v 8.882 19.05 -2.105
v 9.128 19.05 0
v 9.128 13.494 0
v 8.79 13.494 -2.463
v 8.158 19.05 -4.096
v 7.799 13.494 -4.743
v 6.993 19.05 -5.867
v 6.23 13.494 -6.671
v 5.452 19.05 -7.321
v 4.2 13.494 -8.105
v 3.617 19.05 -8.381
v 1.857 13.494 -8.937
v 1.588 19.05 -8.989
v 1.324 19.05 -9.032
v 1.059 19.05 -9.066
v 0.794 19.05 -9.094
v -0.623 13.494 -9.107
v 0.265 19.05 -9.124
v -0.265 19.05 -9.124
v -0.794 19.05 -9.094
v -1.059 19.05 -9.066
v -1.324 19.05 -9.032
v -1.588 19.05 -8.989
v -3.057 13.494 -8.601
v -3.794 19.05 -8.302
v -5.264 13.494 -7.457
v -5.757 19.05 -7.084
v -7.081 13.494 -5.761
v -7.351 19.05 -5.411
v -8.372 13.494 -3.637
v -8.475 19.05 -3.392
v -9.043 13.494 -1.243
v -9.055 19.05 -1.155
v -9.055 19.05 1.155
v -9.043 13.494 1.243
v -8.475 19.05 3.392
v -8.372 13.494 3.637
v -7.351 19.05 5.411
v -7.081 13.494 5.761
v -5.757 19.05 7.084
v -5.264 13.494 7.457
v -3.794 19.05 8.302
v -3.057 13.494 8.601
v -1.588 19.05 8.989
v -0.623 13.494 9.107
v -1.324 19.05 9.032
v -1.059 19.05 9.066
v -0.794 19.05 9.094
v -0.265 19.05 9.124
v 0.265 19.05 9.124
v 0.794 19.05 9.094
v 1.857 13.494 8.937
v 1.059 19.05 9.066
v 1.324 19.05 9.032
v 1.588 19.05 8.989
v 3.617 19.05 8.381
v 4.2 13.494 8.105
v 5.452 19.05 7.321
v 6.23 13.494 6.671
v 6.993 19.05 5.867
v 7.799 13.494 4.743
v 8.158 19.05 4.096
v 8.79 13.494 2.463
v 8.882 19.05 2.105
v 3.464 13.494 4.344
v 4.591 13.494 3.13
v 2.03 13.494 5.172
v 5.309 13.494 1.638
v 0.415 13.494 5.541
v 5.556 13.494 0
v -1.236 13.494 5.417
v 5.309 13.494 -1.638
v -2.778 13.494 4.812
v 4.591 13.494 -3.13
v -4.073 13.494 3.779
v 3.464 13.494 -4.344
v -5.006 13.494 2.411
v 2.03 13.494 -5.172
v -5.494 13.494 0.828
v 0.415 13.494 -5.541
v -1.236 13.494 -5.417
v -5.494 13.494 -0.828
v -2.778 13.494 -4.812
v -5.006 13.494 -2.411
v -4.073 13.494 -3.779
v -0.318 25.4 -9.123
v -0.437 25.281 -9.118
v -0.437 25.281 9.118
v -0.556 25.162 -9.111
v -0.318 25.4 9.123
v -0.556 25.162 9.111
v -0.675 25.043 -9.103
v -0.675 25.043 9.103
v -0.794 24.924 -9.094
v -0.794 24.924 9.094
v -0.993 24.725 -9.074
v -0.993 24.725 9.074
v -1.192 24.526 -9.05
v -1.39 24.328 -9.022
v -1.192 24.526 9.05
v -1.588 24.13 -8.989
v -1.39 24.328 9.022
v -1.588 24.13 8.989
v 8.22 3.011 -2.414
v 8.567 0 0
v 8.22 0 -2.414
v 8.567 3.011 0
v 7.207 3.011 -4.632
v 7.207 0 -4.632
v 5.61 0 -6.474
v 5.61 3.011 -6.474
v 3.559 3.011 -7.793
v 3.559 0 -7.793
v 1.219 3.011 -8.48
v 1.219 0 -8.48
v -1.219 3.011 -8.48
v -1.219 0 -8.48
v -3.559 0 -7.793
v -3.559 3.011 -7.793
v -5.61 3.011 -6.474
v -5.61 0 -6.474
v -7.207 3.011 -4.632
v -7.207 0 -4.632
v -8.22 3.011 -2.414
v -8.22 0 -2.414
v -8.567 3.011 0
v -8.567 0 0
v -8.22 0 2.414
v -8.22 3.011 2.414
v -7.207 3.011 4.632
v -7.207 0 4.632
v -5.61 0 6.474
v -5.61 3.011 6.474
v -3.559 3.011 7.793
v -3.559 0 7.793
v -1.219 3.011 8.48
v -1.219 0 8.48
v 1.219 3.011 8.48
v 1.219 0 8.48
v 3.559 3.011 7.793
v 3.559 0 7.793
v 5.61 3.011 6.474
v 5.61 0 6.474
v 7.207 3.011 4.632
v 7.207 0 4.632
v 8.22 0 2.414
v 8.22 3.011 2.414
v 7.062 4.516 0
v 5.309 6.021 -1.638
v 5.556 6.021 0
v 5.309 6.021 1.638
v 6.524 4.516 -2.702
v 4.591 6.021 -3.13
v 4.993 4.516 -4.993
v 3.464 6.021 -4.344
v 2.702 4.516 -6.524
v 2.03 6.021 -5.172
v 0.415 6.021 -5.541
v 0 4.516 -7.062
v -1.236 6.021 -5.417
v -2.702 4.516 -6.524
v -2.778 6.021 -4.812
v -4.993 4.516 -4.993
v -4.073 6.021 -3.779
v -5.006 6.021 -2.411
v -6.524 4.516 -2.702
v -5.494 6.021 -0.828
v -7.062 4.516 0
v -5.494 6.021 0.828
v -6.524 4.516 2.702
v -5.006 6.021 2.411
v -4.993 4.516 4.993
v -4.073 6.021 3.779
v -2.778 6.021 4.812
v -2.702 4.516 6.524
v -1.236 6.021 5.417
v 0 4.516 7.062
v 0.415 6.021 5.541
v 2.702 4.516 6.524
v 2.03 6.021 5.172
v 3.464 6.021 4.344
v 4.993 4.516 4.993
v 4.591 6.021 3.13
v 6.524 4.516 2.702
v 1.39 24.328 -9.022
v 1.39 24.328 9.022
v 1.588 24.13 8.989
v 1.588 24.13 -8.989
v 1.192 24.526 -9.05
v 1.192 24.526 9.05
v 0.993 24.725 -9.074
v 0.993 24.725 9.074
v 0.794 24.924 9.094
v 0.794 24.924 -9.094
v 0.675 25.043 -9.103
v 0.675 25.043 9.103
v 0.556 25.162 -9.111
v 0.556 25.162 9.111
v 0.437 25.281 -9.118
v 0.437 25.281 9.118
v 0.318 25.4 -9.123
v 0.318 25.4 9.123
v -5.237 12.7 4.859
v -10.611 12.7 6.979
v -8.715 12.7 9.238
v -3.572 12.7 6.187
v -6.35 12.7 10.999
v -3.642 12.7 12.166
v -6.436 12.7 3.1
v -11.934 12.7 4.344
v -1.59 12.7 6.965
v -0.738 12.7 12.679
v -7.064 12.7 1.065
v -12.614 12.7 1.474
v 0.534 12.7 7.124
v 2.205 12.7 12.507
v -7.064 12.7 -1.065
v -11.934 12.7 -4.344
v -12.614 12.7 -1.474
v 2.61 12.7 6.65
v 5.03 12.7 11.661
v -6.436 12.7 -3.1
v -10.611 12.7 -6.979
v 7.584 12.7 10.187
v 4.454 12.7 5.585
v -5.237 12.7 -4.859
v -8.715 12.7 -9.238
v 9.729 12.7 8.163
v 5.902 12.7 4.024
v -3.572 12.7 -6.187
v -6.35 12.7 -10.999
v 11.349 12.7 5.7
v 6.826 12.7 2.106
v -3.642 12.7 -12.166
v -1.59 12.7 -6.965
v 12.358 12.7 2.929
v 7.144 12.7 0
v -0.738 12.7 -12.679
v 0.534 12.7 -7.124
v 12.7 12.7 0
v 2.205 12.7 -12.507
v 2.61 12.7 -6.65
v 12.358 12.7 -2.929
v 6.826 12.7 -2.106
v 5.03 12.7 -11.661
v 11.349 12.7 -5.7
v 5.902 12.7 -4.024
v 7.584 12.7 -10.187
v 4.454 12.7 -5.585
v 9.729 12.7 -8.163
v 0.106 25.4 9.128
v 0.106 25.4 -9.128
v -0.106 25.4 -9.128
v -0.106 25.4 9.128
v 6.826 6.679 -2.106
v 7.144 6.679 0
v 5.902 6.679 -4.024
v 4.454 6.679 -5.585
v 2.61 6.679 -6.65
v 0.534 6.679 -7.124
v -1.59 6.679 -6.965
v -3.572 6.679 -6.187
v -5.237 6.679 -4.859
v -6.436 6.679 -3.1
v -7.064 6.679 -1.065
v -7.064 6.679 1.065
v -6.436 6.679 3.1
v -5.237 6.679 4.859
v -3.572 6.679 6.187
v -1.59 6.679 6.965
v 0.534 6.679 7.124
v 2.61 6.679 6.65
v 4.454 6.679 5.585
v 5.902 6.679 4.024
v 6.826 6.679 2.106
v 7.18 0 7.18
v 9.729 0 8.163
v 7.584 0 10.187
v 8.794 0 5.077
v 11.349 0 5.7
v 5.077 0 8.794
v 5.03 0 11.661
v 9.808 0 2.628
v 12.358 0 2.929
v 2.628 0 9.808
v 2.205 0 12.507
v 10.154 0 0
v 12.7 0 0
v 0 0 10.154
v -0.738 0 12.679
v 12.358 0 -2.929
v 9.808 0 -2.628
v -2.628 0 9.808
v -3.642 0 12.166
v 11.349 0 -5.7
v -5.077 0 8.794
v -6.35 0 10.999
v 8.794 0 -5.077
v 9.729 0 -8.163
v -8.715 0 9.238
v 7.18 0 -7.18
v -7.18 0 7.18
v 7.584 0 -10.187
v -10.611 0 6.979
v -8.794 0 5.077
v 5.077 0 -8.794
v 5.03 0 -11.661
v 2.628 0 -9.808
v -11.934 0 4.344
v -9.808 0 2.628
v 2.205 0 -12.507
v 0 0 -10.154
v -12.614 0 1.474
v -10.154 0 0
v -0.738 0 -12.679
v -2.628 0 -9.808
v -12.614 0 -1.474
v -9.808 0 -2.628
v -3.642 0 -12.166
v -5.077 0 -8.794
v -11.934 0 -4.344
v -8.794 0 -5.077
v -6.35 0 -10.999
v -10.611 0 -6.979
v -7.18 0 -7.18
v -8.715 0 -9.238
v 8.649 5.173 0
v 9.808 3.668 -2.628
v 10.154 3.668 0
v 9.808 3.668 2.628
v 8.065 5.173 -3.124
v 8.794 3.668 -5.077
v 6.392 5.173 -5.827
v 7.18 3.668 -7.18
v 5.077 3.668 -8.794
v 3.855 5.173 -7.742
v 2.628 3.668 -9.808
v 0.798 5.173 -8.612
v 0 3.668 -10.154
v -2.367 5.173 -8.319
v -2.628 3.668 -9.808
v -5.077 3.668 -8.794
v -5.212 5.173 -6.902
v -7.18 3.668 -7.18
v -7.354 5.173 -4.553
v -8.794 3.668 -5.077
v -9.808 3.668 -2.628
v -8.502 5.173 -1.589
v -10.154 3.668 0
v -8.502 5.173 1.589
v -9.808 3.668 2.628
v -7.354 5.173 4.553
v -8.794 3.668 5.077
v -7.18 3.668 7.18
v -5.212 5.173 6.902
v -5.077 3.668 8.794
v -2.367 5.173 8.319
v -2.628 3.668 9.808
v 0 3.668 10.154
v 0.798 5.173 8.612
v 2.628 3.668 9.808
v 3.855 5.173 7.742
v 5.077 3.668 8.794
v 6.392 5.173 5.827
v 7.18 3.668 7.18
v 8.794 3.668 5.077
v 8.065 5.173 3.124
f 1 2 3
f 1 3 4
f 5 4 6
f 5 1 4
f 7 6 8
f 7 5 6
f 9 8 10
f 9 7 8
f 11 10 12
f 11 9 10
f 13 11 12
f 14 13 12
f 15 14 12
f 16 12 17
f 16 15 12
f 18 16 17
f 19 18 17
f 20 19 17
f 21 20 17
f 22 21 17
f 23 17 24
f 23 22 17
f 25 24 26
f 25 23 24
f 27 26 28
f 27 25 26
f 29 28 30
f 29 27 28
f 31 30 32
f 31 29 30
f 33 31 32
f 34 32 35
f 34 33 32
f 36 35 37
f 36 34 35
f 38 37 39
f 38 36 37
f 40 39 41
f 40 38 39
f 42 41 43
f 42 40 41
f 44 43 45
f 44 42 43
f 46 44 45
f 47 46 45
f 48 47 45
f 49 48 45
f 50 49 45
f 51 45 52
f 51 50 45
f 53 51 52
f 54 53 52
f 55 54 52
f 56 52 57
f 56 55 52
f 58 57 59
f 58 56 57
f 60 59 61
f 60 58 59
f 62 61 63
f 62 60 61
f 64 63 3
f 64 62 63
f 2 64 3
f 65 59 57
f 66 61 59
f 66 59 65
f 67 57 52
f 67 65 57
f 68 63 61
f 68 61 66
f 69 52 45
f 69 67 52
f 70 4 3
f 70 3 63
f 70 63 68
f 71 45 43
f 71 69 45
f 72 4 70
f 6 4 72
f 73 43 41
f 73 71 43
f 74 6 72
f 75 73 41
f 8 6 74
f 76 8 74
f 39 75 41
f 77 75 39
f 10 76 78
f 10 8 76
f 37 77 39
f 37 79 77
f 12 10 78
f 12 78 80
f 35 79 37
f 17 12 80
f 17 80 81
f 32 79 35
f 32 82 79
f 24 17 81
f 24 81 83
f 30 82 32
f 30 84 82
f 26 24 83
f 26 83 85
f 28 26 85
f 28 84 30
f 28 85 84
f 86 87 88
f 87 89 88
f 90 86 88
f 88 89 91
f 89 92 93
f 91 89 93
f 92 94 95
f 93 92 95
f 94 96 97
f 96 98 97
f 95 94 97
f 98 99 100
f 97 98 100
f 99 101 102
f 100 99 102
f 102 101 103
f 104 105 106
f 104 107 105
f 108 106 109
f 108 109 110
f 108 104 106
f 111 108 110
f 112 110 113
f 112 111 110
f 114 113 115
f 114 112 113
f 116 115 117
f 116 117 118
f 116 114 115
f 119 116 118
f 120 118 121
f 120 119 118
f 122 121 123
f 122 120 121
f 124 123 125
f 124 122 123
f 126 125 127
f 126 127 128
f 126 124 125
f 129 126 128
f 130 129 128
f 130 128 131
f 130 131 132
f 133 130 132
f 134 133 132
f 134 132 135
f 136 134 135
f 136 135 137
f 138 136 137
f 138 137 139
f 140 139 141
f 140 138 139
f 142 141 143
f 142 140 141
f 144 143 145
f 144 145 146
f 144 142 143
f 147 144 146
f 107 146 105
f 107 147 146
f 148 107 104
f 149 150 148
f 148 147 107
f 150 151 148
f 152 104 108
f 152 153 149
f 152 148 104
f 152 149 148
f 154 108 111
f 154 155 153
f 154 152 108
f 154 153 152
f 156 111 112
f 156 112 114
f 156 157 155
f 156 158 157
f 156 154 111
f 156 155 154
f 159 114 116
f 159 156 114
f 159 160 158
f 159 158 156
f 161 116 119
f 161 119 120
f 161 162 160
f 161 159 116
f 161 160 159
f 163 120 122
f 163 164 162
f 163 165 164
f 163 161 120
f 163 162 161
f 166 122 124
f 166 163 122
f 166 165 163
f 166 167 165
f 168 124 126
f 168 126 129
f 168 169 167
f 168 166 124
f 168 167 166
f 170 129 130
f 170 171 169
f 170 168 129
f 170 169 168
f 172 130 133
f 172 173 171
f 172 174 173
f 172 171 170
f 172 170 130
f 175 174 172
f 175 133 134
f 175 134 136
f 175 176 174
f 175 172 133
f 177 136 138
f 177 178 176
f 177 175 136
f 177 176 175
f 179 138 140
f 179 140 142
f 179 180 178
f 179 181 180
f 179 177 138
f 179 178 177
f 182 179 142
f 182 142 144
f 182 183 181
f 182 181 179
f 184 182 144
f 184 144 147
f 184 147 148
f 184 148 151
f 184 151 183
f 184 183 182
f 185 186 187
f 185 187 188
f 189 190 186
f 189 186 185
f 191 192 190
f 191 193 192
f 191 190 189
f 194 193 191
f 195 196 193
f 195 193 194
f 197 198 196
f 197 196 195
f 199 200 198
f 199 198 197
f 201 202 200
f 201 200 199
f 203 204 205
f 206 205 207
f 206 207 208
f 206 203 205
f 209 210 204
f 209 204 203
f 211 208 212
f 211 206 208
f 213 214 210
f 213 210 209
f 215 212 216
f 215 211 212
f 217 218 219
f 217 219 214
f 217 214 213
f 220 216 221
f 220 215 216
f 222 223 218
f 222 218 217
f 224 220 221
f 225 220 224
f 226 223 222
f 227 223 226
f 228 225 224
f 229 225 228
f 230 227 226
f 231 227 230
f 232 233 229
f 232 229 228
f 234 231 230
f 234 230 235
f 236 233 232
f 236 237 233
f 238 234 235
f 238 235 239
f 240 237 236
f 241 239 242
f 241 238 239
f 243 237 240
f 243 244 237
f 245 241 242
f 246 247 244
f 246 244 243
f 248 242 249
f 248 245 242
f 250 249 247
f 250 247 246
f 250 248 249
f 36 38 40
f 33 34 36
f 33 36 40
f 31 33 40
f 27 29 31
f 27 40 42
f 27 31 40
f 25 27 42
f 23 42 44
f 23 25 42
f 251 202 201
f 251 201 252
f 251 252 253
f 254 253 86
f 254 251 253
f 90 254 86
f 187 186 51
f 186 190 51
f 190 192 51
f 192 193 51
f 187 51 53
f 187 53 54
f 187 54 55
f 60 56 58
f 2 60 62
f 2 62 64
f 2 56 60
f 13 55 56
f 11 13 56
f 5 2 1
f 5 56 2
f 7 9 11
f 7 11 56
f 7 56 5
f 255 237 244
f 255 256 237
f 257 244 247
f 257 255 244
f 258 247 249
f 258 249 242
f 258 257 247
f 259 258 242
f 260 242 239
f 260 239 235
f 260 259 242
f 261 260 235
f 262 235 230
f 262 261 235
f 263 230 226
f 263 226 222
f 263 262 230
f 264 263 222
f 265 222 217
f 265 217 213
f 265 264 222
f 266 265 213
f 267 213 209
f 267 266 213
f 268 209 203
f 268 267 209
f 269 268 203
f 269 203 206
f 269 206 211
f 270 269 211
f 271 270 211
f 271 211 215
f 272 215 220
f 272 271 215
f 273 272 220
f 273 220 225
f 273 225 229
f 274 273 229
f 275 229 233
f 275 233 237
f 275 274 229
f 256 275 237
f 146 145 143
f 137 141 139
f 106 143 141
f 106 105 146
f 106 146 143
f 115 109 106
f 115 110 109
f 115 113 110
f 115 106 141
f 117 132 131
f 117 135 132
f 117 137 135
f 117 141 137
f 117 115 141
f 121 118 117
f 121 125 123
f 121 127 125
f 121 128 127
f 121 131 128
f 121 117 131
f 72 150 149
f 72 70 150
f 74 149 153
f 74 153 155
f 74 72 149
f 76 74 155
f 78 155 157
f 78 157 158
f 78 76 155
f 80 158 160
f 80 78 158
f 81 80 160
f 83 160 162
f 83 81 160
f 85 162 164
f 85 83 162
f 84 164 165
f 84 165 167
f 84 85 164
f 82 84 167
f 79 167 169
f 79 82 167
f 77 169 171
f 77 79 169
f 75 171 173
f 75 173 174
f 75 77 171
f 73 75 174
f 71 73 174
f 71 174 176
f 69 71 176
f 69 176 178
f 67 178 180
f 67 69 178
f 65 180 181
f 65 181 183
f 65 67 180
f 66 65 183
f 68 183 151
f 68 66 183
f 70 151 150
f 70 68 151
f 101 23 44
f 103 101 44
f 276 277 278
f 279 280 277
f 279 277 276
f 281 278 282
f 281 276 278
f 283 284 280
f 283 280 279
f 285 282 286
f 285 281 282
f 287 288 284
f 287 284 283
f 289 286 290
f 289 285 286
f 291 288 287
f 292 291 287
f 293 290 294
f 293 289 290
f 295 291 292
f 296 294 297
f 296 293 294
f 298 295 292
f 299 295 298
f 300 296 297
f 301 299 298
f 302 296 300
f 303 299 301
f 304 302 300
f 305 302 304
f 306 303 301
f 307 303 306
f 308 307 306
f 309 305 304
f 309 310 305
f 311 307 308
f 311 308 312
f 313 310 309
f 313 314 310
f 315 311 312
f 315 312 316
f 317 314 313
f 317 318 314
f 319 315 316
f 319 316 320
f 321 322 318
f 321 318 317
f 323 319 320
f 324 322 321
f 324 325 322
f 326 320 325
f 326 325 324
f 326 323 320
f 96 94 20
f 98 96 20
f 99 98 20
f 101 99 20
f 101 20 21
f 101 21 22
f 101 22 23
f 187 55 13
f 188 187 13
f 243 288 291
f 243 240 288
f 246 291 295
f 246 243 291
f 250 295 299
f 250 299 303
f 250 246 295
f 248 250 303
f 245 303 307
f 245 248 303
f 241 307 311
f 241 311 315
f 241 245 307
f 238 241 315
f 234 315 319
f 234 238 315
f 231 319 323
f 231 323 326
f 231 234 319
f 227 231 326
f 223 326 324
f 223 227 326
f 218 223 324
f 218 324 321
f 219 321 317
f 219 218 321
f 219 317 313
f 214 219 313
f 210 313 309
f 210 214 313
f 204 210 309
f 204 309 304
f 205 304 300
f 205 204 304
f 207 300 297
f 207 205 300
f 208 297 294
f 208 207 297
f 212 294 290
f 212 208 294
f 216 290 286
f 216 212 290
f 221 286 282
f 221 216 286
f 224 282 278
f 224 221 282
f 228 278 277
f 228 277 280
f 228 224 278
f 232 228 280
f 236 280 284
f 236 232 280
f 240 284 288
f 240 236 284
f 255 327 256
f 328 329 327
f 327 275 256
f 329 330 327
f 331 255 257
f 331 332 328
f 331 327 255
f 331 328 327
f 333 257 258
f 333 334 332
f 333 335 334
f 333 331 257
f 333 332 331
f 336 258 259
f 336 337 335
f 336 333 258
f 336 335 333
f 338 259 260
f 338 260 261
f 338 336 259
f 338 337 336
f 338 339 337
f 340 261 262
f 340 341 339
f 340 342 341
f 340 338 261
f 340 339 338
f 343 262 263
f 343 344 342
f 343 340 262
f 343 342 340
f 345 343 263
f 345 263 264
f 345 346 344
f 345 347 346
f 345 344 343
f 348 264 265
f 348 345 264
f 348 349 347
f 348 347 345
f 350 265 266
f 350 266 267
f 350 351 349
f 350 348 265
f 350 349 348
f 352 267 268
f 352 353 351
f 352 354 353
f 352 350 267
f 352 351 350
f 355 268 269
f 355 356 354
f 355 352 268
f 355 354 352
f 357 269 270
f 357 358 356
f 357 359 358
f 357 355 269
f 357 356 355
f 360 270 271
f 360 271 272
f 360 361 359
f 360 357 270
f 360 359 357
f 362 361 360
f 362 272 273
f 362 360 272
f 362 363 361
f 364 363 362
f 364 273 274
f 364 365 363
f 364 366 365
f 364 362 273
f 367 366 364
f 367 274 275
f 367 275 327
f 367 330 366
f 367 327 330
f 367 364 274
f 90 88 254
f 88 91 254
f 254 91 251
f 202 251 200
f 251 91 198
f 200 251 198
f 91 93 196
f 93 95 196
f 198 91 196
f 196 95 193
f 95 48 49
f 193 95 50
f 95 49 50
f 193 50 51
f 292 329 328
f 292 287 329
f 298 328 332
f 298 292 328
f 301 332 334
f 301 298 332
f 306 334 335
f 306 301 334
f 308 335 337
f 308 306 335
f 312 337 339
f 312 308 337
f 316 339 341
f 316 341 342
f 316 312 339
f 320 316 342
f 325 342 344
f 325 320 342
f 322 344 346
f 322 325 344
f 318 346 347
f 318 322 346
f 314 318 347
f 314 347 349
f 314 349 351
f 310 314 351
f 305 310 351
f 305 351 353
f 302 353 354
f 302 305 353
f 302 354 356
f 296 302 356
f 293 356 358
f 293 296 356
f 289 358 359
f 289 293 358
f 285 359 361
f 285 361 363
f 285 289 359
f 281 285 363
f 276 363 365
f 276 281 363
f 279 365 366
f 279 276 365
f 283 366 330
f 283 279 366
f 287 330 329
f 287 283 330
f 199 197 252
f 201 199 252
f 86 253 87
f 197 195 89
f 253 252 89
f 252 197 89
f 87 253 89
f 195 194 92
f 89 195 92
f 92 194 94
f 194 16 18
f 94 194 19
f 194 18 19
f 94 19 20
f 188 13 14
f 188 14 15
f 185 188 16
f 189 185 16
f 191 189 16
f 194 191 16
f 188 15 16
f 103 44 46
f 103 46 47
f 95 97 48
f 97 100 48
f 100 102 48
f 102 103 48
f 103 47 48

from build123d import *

# Parameters (mm, degrees)
F3_DEPTH = 6.35
F4_SIZE  = 1.27


with BuildPart() as f1:
    # F0 (on Top) → F1 (revolve)
    with BuildSketch(Plane.XY):
        Polygon((10.1543589924, 3.6681730227), (10.1543589924, 0), (12.7, 0), (12.7, 12.7), (7.14375, 12.7), (7.14375, 6.6787820151), align=None)
    revolve(axis=Axis((0, 6.35, 0), (0, 1, 0)))


with BuildPart() as f1b:
    # F0 (on Top) → F1, piece 2 (revolve)
    with BuildSketch(Plane.XY):
        Polygon((0, 12.7), (0, 0), (8.5668589924, 0), (8.5668589924, 3.0106089924), (5.55625, 6.0212179849), (5.55625, 12.7), align=None)
        Polygon((0, 19.0500002354), (0, 12.7), (5.55625, 12.7), (5.55625, 13.49375), (7.14375, 13.49375), (9.128125, 13.49375), (9.128125, 19.0500002354), align=None)
    revolve(axis=Axis((0, 6.35, 0), (0, 1, 0)))

    # F2 (on face) → F3 (join)
    with BuildSketch(Plane(origin=(0, 19.0500002354, 0), x_dir=(-1, 0, 0), z_dir=(0, 1, 0))):
        with BuildLine():
            ThreePointArc((1.5875, 8.9890216245), (1.1917715239, 9.0499915276), (0.79375, 9.0935486447))
            Line((0.79375, 9.0935486447), (0.79375, -9.0935486447))
            ThreePointArc((0.79375, -9.0935486447), (1.1917715239, -9.0499915276), (1.5875, -8.9890216245))
            Line((1.5875, -8.9890216245), (1.5875, 8.9890216245))
        make_face()
        with BuildLine():
            Line((-0.79375, -9.0935486447), (-0.79375, 9.0935486447))
            ThreePointArc((-0.79375, 9.0935486447), (-1.1917715239, 9.0499915276), (-1.5875, 8.9890216245))
            Line((-1.5875, 8.9890216245), (-1.5875, -8.9890216245))
            ThreePointArc((-1.5875, -8.9890216245), (-1.1917715239, -9.0499915276), (-0.79375, -9.0935486447))
        make_face()
        with BuildLine():
            ThreePointArc((0.79375, 9.0935486447), (0, 9.128125), (-0.79375, 9.0935486447))
            Line((-0.79375, 9.0935486447), (-0.79375, -9.0935486447))
            ThreePointArc((-0.79375, -9.0935486447), (0, -9.128125), (0.79375, -9.0935486447))
            Line((0.79375, -9.0935486447), (0.79375, 9.0935486447))
        make_face()
    extrude(amount=F3_DEPTH)

    # F4
    f4_edges = [f1b.edges().sort_by_distance(p)[0] for p in [
        (-1.5875, 25.4, 0),
        (1.5875, 25.4, 0),
    ]]
    chamfer(f4_edges, length=F4_SIZE)


solid = Compound([f1.part, f1b.part])
